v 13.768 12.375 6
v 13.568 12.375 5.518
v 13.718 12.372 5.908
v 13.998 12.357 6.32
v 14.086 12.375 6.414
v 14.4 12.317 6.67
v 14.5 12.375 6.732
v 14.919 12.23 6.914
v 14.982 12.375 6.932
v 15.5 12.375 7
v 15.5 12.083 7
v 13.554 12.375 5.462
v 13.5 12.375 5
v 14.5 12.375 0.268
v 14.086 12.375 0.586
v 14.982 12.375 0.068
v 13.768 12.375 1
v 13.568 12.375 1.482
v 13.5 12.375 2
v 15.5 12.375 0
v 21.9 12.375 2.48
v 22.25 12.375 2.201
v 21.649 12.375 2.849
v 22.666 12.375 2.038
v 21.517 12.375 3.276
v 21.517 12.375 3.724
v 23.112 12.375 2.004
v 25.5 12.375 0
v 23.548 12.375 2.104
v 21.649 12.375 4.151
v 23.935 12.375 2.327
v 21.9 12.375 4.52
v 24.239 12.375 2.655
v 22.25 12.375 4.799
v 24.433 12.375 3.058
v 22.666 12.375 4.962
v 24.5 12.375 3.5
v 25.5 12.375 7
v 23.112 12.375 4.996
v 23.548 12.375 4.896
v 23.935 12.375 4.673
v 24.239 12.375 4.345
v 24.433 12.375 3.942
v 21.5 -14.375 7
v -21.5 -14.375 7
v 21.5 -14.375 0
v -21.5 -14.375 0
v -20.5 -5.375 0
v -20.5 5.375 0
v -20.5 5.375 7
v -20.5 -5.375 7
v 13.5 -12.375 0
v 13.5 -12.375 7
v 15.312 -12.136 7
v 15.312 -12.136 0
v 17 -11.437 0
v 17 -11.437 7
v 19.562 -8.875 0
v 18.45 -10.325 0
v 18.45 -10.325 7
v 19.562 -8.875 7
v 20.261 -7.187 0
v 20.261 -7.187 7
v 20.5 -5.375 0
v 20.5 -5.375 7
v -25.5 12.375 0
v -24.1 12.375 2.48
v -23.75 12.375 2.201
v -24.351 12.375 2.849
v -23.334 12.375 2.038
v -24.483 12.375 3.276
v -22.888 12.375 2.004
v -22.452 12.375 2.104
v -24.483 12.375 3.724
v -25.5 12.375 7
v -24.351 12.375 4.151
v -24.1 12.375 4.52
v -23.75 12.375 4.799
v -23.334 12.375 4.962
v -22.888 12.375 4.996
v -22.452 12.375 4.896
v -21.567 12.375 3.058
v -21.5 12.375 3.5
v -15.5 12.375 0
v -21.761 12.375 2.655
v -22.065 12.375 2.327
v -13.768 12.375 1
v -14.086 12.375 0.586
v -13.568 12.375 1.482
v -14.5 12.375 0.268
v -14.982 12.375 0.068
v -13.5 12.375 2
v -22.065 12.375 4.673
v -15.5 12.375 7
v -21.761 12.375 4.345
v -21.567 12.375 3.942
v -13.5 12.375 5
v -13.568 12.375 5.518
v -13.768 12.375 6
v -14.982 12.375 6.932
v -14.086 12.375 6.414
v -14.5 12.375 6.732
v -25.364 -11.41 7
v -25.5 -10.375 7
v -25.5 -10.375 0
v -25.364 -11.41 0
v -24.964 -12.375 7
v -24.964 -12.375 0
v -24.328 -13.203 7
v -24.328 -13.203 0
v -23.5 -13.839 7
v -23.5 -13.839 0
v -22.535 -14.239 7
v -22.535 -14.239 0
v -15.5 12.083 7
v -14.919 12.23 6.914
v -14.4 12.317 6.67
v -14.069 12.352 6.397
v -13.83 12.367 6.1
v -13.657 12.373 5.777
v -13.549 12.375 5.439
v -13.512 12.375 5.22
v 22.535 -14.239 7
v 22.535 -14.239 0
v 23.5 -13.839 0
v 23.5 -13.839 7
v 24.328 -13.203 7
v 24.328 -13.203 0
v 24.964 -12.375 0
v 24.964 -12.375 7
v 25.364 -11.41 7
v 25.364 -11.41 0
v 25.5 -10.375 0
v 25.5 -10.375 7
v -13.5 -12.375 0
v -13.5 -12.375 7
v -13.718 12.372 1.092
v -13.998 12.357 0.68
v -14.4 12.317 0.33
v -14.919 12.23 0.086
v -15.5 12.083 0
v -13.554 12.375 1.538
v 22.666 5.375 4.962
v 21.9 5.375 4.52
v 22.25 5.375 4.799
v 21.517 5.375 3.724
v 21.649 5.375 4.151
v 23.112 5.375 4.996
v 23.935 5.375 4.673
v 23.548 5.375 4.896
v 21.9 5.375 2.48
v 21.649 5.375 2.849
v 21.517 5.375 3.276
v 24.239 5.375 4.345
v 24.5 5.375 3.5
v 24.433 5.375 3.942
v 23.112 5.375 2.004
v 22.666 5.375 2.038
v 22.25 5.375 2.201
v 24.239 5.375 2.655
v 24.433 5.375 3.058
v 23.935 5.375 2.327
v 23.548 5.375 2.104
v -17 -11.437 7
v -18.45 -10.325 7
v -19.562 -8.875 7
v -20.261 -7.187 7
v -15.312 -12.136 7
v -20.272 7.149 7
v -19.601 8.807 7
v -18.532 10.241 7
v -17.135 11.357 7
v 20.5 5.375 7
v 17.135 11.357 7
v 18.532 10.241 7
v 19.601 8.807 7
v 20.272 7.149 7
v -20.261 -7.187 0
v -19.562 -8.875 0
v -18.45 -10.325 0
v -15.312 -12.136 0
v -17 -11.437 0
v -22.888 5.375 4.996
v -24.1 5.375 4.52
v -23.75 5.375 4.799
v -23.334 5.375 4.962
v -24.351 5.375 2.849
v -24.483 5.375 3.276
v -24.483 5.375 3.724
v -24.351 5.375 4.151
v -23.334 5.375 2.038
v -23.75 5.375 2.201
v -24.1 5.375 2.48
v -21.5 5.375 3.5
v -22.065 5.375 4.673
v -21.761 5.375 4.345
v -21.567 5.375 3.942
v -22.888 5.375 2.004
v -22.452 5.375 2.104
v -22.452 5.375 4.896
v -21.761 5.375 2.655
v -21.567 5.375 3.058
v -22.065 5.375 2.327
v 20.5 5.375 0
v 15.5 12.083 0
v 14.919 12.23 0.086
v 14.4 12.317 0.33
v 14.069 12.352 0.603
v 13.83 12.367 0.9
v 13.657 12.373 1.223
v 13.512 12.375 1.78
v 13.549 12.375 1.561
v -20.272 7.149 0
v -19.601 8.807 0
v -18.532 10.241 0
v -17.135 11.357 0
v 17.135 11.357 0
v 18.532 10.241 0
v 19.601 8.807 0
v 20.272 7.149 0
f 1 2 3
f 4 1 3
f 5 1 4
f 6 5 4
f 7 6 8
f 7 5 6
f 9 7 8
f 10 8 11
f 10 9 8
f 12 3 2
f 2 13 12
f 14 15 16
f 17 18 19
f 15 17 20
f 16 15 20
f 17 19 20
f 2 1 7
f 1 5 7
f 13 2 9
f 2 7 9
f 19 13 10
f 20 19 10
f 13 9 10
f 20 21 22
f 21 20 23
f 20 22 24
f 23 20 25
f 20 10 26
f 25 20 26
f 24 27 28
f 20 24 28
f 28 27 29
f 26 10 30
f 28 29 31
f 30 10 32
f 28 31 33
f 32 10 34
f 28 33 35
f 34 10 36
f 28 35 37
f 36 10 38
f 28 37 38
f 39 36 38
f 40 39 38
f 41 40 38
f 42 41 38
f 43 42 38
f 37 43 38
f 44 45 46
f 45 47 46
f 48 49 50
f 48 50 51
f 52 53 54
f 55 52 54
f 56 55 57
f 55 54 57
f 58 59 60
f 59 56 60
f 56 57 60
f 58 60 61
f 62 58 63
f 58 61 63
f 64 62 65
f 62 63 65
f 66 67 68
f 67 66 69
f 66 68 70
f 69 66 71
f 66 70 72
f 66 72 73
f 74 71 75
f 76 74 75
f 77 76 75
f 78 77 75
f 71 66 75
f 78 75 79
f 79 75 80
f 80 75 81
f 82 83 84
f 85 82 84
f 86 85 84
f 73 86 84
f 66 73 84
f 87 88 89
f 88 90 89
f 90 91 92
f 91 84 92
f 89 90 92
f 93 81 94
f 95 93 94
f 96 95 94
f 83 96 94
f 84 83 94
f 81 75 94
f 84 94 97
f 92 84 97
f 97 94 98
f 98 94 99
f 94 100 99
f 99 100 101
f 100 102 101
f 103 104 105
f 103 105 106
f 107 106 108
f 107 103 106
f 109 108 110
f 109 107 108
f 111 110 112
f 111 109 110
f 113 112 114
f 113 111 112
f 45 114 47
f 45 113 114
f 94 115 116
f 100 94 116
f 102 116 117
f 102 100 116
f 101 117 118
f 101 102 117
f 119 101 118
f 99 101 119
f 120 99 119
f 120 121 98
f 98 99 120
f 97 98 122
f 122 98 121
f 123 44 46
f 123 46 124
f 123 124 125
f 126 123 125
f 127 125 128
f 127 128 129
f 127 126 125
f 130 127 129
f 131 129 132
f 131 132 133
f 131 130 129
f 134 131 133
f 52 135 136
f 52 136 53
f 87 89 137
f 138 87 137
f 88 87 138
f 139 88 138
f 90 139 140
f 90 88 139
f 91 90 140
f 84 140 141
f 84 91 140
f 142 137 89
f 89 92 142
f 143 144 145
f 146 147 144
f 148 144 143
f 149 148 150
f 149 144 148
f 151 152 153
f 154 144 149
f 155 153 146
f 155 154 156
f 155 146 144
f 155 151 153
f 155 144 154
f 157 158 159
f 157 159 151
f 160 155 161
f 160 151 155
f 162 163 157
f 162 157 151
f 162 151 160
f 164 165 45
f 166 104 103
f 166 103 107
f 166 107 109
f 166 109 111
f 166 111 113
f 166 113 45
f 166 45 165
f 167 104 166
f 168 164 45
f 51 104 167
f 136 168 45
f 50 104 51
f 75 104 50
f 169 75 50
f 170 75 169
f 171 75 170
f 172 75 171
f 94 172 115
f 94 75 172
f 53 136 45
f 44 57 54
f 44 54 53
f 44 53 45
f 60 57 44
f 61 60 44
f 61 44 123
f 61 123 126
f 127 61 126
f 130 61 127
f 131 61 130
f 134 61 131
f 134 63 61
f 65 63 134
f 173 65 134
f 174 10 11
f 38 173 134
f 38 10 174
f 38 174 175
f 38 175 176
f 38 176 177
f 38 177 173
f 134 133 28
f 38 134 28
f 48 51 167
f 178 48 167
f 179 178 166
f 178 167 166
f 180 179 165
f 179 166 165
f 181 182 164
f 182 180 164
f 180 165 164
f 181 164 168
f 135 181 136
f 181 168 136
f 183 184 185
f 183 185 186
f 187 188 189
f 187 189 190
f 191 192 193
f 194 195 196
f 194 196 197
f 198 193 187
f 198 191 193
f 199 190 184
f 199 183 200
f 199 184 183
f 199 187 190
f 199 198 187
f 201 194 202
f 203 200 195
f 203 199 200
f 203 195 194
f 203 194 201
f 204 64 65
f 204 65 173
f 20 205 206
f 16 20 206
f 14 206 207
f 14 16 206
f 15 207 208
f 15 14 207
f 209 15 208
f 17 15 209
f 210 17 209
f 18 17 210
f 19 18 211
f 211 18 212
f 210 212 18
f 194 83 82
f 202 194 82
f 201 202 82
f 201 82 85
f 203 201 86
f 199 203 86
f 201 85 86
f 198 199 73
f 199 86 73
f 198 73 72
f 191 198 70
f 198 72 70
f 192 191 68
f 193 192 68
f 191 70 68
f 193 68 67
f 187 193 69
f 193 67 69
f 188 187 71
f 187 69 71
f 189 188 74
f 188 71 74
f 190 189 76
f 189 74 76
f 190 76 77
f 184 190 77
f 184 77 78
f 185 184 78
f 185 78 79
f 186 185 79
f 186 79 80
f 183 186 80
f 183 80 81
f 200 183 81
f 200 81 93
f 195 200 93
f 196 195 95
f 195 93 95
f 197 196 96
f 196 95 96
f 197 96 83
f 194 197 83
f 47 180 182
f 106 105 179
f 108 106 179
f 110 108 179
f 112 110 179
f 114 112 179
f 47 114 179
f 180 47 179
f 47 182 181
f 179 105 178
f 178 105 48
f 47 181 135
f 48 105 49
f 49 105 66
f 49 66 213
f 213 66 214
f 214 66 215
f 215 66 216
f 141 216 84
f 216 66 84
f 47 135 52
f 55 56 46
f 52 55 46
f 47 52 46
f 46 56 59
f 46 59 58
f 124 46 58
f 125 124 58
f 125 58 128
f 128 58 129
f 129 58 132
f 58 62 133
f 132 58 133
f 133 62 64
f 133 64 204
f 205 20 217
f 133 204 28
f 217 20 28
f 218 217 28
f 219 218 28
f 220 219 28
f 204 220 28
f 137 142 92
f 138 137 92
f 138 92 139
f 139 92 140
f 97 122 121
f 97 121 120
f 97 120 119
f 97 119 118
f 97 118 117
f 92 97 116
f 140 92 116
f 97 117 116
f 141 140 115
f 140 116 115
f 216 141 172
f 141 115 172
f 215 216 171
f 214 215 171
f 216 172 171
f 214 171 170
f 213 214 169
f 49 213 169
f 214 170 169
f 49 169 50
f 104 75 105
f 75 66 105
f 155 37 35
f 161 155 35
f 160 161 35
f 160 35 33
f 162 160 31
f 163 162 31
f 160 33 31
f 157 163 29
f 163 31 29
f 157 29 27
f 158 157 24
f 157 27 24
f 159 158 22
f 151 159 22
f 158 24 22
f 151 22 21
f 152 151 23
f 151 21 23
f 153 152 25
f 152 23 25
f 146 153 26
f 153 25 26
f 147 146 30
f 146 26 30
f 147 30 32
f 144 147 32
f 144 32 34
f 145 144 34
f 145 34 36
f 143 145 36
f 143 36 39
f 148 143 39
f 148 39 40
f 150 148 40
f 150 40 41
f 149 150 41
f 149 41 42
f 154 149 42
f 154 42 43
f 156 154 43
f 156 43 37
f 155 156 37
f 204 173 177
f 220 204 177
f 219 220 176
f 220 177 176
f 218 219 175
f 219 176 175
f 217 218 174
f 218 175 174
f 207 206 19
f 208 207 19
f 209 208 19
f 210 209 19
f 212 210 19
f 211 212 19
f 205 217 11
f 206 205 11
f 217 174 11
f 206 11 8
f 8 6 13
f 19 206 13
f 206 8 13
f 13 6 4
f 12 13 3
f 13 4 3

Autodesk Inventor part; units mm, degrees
ref_plane "YZ Plane" through (0, 0, 0) normal (1, 0, 0) x (0, 1, 0)
ref_plane "XZ Plane" through (0, 0, 0) normal (0, 1, 0) x (-1, 0, 0)
ref_plane "XY Plane" through (0, 0, 0) normal (0, 0, 1) x (1, 0, 0)
sketch "Sketch1" plane through (0, 0, 0) normal (0, 0, 1) x (1, 0, 0)
  line L0 (17, -8.875) -> (-17, -8.875) construction
  line L1 (-17, -8.875) -> (-17, 8.875) construction
  line L2 (-17, 8.875) -> (17, 8.875) construction
  line L3 (17, 8.875) -> (17, -8.875) construction
  line L4 (17, -8.875) -> (-17, 8.875) construction
  line L5 (-17, -8.875) -> (17, 8.875) construction
  line L6 (20.5, 12.375) -> (-20.5, 12.375)
  line L7 (-20.5, 12.375) -> (-20.5, -12.375)
  line L8 (-20.5, -12.375) -> (20.5, -12.375)
  line L9 (20.5, -12.375) -> (20.5, 12.375)
  line L10 (20.5, 12.375) -> (-20.5, -12.375) construction
  line L11 (-20.5, 12.375) -> (20.5, -12.375) construction
  line L12 (-25.5, -14.375) -> (25.5, -14.375)
  line L13 (25.5, -14.375) -> (25.5, 14.375)
  line L14 (25.5, 14.375) -> (-25.5, 14.375)
  line L15 (-25.5, 14.375) -> (-25.5, -14.375)
  line L16 (-25.5, -14.375) -> (25.5, 14.375) construction
  line L17 (25.5, -14.375) -> (-25.5, 14.375) construction
  line L18 (-20.5, 12.375) -> (-25.5, 12.375)
  line L19 (20.5, 12.375) -> (25.5, 12.375)
  point P0 (0, 0)
  dimension "d0" = 34
  dimension "d1" = 17.75
  dimension "d2" = 41
  dimension "d3" = 24.75
  dimension "d4" = 51
  dimension "d5" = 28.75
extrude "Extrusion1" add sketch "Sketch1" along normal blind 7 contours L19 L13 L12 L15 L18 L7 L8 L9
sketch "Sketch3" plane through (-25.5, 12.375, 0) normal (0, 1, 0) x (1, 0, 0)
  line L0 (0, 0) -> (0, -7) construction
  line L1 (0, -3.5) -> (2.5, -3.5) construction
  line L2 (51, 0) -> (51, -7) construction
  line L3 (51, -3.5) -> (48.5, -3.5) construction
  circle A0 centre (2.5, -3.5) radius 1.5
  circle A1 centre (48.5, -3.5) radius 1.5
  point P0 (25.5, 0)
  dimension "d18" = 2.5
  dimension "d19" = 2.5
  dimension "d20" = 3
  dimension "d21" = 3
extrude "Extrusion3" cut sketch "Sketch3" against normal blind 7
fillet "Fillet1" radius 7 2 edges at (-20.5, -12.375, 3.5) (20.5, -12.375, 3.5)
fillet "Fillet2" radius 4 2 edges at (-25.5, -14.375, 3.5) (25.5, -14.375, 3.5)
sketch "Sketch4" plane through (0, 0, 7) normal (0, 0, 1) x (1, 0, 0)
  line L0 (-20.5, 12.375) -> (-25.5, 12.375) construction
  line L1 (-20.5, 12.375) -> (-20.5, 10.375) construction
  line L2 (-20.5, -5.375) -> (-20.5, 12.375) construction
  line L3 (-20.5, 12.375) -> (-18.5, 12.375) construction
  line L4 (-18.5, 12.375) -> (-16.5, 12.375) construction
  line L5 (-20.5, 10.375) -> (-13.5, 10.375) construction
  line L6 (-13.5, 12.375) -> (-13.5, 5.375) construction
  circle A0 centre (-13.5, 5.375) radius 7
  line L7 (-20.5, 12.375) -> (-13.5, 12.375)
  line L8 (-20.5, 5.375) -> (-20.5, 12.375)
  point P0 (0, 0)
  dimension "d27" = 2
  dimension "d28" = 90
  dimension "d31" = 7
  dimension "d32" = 7
  dimension "d33" = 7
extrude "Extrusion4" add sketch "Sketch4" against normal up to surface (7 mm away) contours A0 L8 L7
mirror "Mirror1" about plane through (0, 0, 0) normal (1, 0, 0) of "Extrusion4"
sketch "Sketch5" plane through (-25.5, 12.375, 7) normal (0, 1, 0) x (1, 0, 0)
  line L0 (0, 7) -> (0, 0) construction
  line L1 (12, 0) -> (0, 0) construction
  line L2 (0, 7) -> (10, 7) construction
  line L3 (12, 5) -> (12, 2) construction
  line L4 (10, 0) -> (0, 0) construction
  line L5 (0, 0) -> (0, 7) construction
  arc A0 (12, 5) -> (10, 7) centre (10, 5) ccw
  arc A1 (10, 0) -> (12, 2) centre (10, 2) ccw
  line L6 (12, 5) -> (12, 2)
  line L7 (10, 0) -> (0, 0)
  line L8 (0, 7) -> (0, 0)
  line L9 (0, 7) -> (10, 7)
  line L10 (39, 7) -> (39, 0) construction
  line L11 (51, 0) -> (39, 0) construction
  line L12 (41, 7) -> (51, 7) construction
  line L13 (51, 7) -> (51, 0) construction
  line L14 (51, 0) -> (41, 0) construction
  line L15 (39, 2) -> (39, 5) construction
  arc A2 (41, 7) -> (39, 5) centre (41, 5) ccw
  arc A3 (39, 2) -> (41, 0) centre (41, 2) ccw
  line L16 (41, 7) -> (51, 7)
  line L17 (51, 0) -> (51, 7)
  line L18 (51, 0) -> (41, 0)
  line L19 (39, 2) -> (39, 5)
  line L20 (12, 0) -> (12, 7) projected
  line L21 (10, 7) -> (12, 7)
  line L22 (12, 7) -> (12, 5)
  line L23 (12, 2) -> (12, 0)
  line L24 (12, 0) -> (10, 0)
  line L25 (41, 7) -> (39, 7)
  line L26 (39, 5) -> (39, 7)
  line L27 (39, 2) -> (39, 0)
  line L28 (41, 0) -> (39, 0)
  point P0 (25.5, 7)
  dimension "d36" = 2
  dimension "d37" = 2
  dimension "d38" = 2
extrude "Extrusion5" cut sketch "Sketch5" against normal blind 1 contours A0 L21 L20 | L20 L24 A1 | A2 L26 L25 | A3 L28 L27
properties part number "Clamp_v4_bot"
